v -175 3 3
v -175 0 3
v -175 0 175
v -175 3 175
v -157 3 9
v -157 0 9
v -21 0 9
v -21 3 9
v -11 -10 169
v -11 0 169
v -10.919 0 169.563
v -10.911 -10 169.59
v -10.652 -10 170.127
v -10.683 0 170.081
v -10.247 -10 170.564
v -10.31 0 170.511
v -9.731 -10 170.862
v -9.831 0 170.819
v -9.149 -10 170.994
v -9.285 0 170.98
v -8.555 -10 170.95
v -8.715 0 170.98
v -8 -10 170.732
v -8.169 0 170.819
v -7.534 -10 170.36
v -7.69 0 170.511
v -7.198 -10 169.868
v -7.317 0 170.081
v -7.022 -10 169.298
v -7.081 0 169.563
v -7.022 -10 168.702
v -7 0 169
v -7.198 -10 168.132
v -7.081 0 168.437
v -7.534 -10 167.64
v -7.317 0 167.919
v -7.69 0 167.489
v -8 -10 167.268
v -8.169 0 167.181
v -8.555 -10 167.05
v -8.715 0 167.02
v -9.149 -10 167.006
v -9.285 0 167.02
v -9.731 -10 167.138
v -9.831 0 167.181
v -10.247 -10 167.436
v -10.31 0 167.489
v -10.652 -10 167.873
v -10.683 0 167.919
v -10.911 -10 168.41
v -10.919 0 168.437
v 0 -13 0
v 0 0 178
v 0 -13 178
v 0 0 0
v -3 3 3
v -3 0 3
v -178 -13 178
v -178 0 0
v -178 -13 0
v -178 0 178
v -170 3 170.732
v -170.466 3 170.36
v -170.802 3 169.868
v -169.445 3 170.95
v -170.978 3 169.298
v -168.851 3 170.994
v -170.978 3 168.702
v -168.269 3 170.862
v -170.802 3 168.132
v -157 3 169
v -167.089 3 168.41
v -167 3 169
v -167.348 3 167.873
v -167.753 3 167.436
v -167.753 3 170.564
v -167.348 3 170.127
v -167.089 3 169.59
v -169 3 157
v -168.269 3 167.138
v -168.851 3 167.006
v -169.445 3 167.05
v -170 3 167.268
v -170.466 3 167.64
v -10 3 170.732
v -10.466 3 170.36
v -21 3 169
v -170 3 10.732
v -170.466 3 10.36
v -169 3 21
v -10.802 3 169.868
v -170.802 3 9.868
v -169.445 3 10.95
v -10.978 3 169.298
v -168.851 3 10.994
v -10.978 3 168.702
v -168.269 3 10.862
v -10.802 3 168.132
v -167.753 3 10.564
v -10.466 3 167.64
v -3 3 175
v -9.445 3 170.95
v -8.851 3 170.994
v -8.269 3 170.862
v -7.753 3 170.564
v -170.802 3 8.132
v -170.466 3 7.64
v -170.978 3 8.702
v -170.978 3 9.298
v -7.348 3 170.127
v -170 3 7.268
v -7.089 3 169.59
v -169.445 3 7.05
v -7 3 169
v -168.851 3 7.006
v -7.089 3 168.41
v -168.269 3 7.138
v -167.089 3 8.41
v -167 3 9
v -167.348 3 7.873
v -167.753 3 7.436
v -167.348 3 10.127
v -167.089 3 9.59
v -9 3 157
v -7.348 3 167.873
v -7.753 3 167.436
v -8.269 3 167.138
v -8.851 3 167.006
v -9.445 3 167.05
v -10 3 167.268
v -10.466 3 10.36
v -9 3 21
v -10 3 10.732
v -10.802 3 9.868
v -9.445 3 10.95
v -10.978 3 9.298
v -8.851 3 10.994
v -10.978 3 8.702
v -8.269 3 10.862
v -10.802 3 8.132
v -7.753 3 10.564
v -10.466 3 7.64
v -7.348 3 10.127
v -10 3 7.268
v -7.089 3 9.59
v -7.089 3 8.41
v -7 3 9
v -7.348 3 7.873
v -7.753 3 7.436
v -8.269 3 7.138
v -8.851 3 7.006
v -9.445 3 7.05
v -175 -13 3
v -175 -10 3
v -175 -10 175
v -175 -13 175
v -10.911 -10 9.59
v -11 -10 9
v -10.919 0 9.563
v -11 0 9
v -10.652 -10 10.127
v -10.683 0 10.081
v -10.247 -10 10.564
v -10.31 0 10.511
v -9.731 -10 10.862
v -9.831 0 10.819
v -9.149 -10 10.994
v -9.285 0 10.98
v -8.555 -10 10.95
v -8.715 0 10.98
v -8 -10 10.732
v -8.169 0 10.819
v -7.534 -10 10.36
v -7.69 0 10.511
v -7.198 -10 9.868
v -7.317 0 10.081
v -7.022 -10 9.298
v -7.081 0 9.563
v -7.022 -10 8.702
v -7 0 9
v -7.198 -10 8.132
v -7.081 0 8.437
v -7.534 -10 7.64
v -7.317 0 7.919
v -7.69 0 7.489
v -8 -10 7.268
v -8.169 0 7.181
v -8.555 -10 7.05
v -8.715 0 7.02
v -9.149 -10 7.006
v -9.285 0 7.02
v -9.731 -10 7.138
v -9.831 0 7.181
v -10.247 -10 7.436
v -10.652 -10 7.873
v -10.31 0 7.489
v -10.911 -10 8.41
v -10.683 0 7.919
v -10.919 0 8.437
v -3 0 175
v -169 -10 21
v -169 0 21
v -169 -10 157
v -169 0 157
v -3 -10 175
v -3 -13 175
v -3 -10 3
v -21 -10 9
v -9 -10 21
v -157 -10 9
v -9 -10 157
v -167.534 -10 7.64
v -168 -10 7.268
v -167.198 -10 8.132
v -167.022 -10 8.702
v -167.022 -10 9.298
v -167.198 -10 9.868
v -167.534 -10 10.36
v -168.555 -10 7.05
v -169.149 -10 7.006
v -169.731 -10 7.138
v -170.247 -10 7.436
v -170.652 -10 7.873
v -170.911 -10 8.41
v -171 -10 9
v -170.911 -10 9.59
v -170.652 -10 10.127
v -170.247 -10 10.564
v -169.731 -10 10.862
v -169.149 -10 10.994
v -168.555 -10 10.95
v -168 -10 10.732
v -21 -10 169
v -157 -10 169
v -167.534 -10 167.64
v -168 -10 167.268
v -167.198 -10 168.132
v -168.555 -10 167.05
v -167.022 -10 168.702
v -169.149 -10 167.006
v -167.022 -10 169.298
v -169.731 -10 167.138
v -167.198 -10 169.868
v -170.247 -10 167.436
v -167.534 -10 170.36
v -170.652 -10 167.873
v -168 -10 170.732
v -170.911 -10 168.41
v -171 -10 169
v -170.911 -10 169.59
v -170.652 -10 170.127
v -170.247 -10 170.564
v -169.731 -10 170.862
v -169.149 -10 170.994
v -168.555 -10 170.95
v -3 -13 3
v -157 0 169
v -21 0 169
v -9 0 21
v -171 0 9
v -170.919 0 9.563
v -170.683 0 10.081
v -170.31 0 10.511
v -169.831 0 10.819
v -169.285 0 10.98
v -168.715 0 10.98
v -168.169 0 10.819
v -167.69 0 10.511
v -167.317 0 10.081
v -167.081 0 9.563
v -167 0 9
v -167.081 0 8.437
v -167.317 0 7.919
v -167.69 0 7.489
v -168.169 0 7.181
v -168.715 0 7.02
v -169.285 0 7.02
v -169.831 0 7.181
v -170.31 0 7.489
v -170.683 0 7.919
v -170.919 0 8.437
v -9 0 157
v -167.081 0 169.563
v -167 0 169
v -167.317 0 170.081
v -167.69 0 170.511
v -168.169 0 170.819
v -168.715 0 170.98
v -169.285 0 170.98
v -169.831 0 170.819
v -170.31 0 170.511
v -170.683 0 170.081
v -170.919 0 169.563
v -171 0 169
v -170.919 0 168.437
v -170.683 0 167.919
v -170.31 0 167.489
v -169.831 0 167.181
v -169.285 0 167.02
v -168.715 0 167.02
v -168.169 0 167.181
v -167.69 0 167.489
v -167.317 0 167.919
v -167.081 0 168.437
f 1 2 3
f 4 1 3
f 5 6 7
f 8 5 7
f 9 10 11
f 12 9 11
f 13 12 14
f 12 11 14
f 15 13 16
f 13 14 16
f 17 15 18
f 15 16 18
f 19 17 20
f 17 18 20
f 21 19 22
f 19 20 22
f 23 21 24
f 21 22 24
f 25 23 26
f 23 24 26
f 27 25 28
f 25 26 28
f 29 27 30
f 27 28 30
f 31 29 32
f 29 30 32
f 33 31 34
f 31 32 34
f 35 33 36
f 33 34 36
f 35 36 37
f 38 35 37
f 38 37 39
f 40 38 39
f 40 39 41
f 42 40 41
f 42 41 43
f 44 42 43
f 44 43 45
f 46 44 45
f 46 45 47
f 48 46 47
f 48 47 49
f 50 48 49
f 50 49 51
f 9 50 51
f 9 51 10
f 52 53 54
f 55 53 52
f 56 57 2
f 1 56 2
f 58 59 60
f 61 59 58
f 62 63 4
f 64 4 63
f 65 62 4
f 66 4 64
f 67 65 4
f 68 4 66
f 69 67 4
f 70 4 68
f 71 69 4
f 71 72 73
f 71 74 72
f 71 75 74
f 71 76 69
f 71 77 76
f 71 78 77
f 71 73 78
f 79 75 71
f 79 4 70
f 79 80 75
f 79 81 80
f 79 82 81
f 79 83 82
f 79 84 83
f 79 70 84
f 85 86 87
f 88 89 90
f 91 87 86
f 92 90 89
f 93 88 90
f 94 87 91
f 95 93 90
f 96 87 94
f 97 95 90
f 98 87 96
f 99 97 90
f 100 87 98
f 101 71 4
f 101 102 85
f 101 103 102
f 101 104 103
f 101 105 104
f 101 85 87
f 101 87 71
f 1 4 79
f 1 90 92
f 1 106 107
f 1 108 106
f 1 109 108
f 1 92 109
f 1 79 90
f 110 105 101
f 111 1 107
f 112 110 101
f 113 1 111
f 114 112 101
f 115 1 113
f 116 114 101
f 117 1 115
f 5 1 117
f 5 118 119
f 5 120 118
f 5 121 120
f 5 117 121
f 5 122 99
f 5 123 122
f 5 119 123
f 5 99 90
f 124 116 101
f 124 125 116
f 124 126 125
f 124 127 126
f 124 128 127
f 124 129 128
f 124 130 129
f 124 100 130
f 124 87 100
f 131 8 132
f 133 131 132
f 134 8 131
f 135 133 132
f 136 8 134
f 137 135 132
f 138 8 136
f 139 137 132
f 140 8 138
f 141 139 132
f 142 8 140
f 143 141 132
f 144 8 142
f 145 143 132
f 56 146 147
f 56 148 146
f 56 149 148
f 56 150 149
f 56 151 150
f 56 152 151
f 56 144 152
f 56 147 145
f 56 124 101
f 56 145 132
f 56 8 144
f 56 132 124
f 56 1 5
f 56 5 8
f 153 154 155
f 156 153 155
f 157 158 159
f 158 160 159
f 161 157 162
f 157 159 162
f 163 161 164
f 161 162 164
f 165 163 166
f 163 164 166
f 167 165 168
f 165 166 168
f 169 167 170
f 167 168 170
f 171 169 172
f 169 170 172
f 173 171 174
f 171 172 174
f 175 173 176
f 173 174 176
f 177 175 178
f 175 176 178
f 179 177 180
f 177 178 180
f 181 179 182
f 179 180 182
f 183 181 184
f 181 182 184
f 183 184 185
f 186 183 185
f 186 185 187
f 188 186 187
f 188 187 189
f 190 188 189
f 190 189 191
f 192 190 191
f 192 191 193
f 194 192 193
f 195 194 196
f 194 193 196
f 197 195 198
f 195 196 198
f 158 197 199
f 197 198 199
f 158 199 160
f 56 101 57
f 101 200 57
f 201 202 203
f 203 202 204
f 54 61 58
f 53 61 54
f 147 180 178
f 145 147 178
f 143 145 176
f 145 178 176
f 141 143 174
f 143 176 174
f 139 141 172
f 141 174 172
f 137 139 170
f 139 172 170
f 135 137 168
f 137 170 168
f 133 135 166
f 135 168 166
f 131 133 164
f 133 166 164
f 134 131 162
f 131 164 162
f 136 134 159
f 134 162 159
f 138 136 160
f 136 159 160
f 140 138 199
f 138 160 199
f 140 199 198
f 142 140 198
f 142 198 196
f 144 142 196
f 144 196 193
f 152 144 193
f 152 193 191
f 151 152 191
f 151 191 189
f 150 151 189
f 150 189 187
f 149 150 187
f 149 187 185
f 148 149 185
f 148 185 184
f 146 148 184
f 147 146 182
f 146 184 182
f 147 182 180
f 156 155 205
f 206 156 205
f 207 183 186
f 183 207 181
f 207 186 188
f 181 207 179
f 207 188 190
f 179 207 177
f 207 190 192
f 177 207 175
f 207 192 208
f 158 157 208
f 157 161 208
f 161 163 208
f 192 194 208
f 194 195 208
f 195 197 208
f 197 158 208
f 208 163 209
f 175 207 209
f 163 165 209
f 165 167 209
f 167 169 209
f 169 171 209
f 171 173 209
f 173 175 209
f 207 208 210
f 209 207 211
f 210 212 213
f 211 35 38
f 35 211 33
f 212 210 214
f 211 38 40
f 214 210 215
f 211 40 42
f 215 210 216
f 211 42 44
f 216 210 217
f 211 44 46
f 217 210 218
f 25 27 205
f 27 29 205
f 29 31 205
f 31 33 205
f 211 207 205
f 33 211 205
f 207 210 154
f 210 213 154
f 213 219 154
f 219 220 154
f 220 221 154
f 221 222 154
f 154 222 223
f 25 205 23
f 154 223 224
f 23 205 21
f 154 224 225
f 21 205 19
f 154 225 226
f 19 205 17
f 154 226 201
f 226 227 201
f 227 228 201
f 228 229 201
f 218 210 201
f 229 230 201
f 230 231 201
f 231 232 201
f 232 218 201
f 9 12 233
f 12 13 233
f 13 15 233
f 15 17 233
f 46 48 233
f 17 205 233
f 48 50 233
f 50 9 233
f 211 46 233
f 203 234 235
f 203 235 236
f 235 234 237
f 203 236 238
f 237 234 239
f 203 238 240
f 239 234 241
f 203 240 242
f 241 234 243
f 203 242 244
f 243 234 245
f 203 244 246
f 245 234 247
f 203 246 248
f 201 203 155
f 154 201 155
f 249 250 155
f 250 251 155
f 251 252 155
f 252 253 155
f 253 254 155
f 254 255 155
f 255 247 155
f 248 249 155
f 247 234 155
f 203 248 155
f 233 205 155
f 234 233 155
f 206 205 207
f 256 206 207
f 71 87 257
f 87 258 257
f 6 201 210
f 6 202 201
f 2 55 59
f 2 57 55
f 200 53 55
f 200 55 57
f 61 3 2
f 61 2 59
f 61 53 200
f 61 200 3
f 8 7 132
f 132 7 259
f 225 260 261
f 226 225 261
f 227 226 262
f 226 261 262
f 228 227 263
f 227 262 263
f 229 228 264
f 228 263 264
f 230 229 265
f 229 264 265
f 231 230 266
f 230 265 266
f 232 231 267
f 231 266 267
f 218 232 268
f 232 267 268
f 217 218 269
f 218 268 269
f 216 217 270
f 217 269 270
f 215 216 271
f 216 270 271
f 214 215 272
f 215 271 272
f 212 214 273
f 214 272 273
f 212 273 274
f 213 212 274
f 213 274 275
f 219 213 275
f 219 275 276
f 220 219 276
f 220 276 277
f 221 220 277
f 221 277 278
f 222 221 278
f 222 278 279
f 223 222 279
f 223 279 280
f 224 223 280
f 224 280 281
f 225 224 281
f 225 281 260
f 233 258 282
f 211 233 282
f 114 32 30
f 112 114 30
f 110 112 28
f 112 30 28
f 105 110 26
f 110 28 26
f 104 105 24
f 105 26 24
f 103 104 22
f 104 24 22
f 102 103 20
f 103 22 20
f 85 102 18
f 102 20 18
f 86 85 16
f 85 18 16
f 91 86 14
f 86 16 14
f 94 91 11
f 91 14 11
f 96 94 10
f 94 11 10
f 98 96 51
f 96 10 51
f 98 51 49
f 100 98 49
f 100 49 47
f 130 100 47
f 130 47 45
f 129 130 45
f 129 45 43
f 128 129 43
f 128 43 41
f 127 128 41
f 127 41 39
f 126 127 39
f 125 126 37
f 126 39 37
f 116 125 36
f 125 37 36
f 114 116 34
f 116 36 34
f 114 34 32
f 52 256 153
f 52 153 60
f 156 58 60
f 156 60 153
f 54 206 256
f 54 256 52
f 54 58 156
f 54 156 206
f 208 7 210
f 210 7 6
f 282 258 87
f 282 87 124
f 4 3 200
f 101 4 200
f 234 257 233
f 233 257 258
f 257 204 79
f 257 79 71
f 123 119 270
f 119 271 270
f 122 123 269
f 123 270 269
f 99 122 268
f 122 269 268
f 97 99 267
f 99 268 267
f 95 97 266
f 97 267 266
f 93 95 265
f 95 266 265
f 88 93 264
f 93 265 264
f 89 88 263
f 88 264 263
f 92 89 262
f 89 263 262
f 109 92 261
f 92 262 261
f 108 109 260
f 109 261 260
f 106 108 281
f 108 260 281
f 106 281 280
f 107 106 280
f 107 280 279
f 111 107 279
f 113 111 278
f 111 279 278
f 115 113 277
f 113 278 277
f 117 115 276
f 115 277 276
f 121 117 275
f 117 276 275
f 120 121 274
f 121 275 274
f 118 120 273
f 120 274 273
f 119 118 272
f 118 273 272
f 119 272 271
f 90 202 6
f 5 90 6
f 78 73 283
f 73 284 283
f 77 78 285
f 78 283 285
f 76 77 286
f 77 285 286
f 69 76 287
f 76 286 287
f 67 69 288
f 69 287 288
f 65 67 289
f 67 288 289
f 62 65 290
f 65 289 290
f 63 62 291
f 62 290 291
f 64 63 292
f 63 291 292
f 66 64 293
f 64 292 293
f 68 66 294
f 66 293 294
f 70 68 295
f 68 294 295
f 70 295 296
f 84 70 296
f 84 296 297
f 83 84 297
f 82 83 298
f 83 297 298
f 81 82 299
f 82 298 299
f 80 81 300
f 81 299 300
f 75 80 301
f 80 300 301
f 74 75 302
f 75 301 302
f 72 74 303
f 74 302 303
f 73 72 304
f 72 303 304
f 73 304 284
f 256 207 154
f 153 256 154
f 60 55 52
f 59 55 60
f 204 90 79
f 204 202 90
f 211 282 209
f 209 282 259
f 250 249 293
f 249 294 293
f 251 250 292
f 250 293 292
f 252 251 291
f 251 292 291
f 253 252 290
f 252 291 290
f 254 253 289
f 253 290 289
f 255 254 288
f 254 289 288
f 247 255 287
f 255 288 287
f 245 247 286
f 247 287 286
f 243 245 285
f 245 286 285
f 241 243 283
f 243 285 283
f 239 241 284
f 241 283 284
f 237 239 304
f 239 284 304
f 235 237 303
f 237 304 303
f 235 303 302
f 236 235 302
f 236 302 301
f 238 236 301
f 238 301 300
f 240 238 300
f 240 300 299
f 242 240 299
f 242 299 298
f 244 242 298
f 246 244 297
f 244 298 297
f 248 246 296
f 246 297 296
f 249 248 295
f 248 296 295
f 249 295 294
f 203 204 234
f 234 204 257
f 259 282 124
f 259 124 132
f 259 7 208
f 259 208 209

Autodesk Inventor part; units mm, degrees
ref_plane "YZ Plane" through (0, 0, 0) normal (1, 0, 0) x (0, 1, 0)
ref_plane "XZ Plane" through (0, 0, 0) normal (0, 1, 0) x (-1, 0, 0)
ref_plane "XY Plane" through (0, 0, 0) normal (0, 0, 1) x (1, 0, 0)
sketch "Náčrt1" plane through (0, 0, 0) normal (0, 1, 0) x (-1, 0, 0)
  line L0 (0, 0) -> (178, 0)
  line L1 (178, 0) -> (178, 178)
  line L2 (178, 178) -> (0, 178)
  line L3 (0, 178) -> (0, 0)
  circle A0 centre (9, 9) radius 2
  circle A1 centre (169, 169) radius 2
  circle A2 centre (9, 169) radius 2
  circle A3 centre (169, 9) radius 2
  line L4 (163, 163) -> (157, 169)
  line L5 (163, 15) -> (169, 21)
  line L6 (21, 9) -> (157, 9)
  line L7 (15, 15) -> (21, 9)
  line L8 (15, 15) -> (9, 21)
  line L9 (169, 21) -> (157, 9)
  line L10 (21, 169) -> (9, 157)
  line L11 (9, 157) -> (9, 21)
  line L12 (157, 169) -> (21, 169)
  line L13 (169, 21) -> (169, 157)
  line L14 (163, 163) -> (169, 157)
  dimension "d0" = 178
  dimension "d1" = 178
  dimension "d37" = 9
  dimension "d38" = 9
extrude "Vysunutí1" add sketch "Náčrt1" against normal blind 10
sketch "Náčrt2" plane through (0, -10, 0) normal (0, -1, 0) x (1, 0, 0)
  line L0 (-3, 3) -> (-175, 3)
  line L1 (-175, 3) -> (-175, 175)
  line L2 (-175, 175) -> (-3, 175)
  line L3 (-3, 175) -> (-3, 3)
  line L4 (-178, 0) -> (0, 0) projected
  line L5 (0, 0) -> (0, 178) projected
  line L6 (-178, 0) -> (0, 0)
  line L7 (0, 0) -> (0, 178)
  line L8 (0, 178) -> (-178, 178)
  line L9 (-178, 178) -> (-178, 0)
  dimension "d68" = 172
  dimension "d69" = 172
extrude "Vysunutí2" add sketch "Náčrt2" along normal blind 3
sketch "Náčrt3" plane through (0, 0, 0) normal (0, 1, 0) x (1, 0, 0)
  line L0 (-3, -3) -> (-175, -3)
  line L1 (-175, -3) -> (-175, -175)
  line L2 (-175, -175) -> (-3, -175)
  line L3 (-3, -175) -> (-3, -3)
  line L4 (-169, -21) -> (-157, -9) projected
  line L5 (-157, -9) -> (-169, -21)
  line L6 (-169, -21) -> (-169, -157)
  line L7 (-175, -175) -> (-175, -3) projected
  line L8 (-169, -157) -> (-157, -169)
  line L9 (-21, -169) -> (-157, -169) projected
  line L10 (-157, -169) -> (-21, -169)
  line L11 (-9, -157) -> (-9, -21) projected
  line L12 (-21, -169) -> (-9, -157)
  line L13 (-21, -9) -> (-9, -21) projected
  line L14 (-9, -157) -> (-9, -21)
  line L15 (-9, -21) -> (-21, -9)
  line L16 (-157, -9) -> (-21, -9) projected
  line L17 (-21, -9) -> (-157, -9)
  circle A0 centre (-9, -9) radius 2
  circle A1 centre (-9, -169) radius 2 projected
  circle A2 centre (-9, -169) radius 2
  circle A3 centre (-169, -9) radius 2
  circle A4 centre (-169, -169) radius 2
extrude "Vysunutí4" add sketch "Náčrt3" along normal blind 3
properties part number "Cougar_Base"
